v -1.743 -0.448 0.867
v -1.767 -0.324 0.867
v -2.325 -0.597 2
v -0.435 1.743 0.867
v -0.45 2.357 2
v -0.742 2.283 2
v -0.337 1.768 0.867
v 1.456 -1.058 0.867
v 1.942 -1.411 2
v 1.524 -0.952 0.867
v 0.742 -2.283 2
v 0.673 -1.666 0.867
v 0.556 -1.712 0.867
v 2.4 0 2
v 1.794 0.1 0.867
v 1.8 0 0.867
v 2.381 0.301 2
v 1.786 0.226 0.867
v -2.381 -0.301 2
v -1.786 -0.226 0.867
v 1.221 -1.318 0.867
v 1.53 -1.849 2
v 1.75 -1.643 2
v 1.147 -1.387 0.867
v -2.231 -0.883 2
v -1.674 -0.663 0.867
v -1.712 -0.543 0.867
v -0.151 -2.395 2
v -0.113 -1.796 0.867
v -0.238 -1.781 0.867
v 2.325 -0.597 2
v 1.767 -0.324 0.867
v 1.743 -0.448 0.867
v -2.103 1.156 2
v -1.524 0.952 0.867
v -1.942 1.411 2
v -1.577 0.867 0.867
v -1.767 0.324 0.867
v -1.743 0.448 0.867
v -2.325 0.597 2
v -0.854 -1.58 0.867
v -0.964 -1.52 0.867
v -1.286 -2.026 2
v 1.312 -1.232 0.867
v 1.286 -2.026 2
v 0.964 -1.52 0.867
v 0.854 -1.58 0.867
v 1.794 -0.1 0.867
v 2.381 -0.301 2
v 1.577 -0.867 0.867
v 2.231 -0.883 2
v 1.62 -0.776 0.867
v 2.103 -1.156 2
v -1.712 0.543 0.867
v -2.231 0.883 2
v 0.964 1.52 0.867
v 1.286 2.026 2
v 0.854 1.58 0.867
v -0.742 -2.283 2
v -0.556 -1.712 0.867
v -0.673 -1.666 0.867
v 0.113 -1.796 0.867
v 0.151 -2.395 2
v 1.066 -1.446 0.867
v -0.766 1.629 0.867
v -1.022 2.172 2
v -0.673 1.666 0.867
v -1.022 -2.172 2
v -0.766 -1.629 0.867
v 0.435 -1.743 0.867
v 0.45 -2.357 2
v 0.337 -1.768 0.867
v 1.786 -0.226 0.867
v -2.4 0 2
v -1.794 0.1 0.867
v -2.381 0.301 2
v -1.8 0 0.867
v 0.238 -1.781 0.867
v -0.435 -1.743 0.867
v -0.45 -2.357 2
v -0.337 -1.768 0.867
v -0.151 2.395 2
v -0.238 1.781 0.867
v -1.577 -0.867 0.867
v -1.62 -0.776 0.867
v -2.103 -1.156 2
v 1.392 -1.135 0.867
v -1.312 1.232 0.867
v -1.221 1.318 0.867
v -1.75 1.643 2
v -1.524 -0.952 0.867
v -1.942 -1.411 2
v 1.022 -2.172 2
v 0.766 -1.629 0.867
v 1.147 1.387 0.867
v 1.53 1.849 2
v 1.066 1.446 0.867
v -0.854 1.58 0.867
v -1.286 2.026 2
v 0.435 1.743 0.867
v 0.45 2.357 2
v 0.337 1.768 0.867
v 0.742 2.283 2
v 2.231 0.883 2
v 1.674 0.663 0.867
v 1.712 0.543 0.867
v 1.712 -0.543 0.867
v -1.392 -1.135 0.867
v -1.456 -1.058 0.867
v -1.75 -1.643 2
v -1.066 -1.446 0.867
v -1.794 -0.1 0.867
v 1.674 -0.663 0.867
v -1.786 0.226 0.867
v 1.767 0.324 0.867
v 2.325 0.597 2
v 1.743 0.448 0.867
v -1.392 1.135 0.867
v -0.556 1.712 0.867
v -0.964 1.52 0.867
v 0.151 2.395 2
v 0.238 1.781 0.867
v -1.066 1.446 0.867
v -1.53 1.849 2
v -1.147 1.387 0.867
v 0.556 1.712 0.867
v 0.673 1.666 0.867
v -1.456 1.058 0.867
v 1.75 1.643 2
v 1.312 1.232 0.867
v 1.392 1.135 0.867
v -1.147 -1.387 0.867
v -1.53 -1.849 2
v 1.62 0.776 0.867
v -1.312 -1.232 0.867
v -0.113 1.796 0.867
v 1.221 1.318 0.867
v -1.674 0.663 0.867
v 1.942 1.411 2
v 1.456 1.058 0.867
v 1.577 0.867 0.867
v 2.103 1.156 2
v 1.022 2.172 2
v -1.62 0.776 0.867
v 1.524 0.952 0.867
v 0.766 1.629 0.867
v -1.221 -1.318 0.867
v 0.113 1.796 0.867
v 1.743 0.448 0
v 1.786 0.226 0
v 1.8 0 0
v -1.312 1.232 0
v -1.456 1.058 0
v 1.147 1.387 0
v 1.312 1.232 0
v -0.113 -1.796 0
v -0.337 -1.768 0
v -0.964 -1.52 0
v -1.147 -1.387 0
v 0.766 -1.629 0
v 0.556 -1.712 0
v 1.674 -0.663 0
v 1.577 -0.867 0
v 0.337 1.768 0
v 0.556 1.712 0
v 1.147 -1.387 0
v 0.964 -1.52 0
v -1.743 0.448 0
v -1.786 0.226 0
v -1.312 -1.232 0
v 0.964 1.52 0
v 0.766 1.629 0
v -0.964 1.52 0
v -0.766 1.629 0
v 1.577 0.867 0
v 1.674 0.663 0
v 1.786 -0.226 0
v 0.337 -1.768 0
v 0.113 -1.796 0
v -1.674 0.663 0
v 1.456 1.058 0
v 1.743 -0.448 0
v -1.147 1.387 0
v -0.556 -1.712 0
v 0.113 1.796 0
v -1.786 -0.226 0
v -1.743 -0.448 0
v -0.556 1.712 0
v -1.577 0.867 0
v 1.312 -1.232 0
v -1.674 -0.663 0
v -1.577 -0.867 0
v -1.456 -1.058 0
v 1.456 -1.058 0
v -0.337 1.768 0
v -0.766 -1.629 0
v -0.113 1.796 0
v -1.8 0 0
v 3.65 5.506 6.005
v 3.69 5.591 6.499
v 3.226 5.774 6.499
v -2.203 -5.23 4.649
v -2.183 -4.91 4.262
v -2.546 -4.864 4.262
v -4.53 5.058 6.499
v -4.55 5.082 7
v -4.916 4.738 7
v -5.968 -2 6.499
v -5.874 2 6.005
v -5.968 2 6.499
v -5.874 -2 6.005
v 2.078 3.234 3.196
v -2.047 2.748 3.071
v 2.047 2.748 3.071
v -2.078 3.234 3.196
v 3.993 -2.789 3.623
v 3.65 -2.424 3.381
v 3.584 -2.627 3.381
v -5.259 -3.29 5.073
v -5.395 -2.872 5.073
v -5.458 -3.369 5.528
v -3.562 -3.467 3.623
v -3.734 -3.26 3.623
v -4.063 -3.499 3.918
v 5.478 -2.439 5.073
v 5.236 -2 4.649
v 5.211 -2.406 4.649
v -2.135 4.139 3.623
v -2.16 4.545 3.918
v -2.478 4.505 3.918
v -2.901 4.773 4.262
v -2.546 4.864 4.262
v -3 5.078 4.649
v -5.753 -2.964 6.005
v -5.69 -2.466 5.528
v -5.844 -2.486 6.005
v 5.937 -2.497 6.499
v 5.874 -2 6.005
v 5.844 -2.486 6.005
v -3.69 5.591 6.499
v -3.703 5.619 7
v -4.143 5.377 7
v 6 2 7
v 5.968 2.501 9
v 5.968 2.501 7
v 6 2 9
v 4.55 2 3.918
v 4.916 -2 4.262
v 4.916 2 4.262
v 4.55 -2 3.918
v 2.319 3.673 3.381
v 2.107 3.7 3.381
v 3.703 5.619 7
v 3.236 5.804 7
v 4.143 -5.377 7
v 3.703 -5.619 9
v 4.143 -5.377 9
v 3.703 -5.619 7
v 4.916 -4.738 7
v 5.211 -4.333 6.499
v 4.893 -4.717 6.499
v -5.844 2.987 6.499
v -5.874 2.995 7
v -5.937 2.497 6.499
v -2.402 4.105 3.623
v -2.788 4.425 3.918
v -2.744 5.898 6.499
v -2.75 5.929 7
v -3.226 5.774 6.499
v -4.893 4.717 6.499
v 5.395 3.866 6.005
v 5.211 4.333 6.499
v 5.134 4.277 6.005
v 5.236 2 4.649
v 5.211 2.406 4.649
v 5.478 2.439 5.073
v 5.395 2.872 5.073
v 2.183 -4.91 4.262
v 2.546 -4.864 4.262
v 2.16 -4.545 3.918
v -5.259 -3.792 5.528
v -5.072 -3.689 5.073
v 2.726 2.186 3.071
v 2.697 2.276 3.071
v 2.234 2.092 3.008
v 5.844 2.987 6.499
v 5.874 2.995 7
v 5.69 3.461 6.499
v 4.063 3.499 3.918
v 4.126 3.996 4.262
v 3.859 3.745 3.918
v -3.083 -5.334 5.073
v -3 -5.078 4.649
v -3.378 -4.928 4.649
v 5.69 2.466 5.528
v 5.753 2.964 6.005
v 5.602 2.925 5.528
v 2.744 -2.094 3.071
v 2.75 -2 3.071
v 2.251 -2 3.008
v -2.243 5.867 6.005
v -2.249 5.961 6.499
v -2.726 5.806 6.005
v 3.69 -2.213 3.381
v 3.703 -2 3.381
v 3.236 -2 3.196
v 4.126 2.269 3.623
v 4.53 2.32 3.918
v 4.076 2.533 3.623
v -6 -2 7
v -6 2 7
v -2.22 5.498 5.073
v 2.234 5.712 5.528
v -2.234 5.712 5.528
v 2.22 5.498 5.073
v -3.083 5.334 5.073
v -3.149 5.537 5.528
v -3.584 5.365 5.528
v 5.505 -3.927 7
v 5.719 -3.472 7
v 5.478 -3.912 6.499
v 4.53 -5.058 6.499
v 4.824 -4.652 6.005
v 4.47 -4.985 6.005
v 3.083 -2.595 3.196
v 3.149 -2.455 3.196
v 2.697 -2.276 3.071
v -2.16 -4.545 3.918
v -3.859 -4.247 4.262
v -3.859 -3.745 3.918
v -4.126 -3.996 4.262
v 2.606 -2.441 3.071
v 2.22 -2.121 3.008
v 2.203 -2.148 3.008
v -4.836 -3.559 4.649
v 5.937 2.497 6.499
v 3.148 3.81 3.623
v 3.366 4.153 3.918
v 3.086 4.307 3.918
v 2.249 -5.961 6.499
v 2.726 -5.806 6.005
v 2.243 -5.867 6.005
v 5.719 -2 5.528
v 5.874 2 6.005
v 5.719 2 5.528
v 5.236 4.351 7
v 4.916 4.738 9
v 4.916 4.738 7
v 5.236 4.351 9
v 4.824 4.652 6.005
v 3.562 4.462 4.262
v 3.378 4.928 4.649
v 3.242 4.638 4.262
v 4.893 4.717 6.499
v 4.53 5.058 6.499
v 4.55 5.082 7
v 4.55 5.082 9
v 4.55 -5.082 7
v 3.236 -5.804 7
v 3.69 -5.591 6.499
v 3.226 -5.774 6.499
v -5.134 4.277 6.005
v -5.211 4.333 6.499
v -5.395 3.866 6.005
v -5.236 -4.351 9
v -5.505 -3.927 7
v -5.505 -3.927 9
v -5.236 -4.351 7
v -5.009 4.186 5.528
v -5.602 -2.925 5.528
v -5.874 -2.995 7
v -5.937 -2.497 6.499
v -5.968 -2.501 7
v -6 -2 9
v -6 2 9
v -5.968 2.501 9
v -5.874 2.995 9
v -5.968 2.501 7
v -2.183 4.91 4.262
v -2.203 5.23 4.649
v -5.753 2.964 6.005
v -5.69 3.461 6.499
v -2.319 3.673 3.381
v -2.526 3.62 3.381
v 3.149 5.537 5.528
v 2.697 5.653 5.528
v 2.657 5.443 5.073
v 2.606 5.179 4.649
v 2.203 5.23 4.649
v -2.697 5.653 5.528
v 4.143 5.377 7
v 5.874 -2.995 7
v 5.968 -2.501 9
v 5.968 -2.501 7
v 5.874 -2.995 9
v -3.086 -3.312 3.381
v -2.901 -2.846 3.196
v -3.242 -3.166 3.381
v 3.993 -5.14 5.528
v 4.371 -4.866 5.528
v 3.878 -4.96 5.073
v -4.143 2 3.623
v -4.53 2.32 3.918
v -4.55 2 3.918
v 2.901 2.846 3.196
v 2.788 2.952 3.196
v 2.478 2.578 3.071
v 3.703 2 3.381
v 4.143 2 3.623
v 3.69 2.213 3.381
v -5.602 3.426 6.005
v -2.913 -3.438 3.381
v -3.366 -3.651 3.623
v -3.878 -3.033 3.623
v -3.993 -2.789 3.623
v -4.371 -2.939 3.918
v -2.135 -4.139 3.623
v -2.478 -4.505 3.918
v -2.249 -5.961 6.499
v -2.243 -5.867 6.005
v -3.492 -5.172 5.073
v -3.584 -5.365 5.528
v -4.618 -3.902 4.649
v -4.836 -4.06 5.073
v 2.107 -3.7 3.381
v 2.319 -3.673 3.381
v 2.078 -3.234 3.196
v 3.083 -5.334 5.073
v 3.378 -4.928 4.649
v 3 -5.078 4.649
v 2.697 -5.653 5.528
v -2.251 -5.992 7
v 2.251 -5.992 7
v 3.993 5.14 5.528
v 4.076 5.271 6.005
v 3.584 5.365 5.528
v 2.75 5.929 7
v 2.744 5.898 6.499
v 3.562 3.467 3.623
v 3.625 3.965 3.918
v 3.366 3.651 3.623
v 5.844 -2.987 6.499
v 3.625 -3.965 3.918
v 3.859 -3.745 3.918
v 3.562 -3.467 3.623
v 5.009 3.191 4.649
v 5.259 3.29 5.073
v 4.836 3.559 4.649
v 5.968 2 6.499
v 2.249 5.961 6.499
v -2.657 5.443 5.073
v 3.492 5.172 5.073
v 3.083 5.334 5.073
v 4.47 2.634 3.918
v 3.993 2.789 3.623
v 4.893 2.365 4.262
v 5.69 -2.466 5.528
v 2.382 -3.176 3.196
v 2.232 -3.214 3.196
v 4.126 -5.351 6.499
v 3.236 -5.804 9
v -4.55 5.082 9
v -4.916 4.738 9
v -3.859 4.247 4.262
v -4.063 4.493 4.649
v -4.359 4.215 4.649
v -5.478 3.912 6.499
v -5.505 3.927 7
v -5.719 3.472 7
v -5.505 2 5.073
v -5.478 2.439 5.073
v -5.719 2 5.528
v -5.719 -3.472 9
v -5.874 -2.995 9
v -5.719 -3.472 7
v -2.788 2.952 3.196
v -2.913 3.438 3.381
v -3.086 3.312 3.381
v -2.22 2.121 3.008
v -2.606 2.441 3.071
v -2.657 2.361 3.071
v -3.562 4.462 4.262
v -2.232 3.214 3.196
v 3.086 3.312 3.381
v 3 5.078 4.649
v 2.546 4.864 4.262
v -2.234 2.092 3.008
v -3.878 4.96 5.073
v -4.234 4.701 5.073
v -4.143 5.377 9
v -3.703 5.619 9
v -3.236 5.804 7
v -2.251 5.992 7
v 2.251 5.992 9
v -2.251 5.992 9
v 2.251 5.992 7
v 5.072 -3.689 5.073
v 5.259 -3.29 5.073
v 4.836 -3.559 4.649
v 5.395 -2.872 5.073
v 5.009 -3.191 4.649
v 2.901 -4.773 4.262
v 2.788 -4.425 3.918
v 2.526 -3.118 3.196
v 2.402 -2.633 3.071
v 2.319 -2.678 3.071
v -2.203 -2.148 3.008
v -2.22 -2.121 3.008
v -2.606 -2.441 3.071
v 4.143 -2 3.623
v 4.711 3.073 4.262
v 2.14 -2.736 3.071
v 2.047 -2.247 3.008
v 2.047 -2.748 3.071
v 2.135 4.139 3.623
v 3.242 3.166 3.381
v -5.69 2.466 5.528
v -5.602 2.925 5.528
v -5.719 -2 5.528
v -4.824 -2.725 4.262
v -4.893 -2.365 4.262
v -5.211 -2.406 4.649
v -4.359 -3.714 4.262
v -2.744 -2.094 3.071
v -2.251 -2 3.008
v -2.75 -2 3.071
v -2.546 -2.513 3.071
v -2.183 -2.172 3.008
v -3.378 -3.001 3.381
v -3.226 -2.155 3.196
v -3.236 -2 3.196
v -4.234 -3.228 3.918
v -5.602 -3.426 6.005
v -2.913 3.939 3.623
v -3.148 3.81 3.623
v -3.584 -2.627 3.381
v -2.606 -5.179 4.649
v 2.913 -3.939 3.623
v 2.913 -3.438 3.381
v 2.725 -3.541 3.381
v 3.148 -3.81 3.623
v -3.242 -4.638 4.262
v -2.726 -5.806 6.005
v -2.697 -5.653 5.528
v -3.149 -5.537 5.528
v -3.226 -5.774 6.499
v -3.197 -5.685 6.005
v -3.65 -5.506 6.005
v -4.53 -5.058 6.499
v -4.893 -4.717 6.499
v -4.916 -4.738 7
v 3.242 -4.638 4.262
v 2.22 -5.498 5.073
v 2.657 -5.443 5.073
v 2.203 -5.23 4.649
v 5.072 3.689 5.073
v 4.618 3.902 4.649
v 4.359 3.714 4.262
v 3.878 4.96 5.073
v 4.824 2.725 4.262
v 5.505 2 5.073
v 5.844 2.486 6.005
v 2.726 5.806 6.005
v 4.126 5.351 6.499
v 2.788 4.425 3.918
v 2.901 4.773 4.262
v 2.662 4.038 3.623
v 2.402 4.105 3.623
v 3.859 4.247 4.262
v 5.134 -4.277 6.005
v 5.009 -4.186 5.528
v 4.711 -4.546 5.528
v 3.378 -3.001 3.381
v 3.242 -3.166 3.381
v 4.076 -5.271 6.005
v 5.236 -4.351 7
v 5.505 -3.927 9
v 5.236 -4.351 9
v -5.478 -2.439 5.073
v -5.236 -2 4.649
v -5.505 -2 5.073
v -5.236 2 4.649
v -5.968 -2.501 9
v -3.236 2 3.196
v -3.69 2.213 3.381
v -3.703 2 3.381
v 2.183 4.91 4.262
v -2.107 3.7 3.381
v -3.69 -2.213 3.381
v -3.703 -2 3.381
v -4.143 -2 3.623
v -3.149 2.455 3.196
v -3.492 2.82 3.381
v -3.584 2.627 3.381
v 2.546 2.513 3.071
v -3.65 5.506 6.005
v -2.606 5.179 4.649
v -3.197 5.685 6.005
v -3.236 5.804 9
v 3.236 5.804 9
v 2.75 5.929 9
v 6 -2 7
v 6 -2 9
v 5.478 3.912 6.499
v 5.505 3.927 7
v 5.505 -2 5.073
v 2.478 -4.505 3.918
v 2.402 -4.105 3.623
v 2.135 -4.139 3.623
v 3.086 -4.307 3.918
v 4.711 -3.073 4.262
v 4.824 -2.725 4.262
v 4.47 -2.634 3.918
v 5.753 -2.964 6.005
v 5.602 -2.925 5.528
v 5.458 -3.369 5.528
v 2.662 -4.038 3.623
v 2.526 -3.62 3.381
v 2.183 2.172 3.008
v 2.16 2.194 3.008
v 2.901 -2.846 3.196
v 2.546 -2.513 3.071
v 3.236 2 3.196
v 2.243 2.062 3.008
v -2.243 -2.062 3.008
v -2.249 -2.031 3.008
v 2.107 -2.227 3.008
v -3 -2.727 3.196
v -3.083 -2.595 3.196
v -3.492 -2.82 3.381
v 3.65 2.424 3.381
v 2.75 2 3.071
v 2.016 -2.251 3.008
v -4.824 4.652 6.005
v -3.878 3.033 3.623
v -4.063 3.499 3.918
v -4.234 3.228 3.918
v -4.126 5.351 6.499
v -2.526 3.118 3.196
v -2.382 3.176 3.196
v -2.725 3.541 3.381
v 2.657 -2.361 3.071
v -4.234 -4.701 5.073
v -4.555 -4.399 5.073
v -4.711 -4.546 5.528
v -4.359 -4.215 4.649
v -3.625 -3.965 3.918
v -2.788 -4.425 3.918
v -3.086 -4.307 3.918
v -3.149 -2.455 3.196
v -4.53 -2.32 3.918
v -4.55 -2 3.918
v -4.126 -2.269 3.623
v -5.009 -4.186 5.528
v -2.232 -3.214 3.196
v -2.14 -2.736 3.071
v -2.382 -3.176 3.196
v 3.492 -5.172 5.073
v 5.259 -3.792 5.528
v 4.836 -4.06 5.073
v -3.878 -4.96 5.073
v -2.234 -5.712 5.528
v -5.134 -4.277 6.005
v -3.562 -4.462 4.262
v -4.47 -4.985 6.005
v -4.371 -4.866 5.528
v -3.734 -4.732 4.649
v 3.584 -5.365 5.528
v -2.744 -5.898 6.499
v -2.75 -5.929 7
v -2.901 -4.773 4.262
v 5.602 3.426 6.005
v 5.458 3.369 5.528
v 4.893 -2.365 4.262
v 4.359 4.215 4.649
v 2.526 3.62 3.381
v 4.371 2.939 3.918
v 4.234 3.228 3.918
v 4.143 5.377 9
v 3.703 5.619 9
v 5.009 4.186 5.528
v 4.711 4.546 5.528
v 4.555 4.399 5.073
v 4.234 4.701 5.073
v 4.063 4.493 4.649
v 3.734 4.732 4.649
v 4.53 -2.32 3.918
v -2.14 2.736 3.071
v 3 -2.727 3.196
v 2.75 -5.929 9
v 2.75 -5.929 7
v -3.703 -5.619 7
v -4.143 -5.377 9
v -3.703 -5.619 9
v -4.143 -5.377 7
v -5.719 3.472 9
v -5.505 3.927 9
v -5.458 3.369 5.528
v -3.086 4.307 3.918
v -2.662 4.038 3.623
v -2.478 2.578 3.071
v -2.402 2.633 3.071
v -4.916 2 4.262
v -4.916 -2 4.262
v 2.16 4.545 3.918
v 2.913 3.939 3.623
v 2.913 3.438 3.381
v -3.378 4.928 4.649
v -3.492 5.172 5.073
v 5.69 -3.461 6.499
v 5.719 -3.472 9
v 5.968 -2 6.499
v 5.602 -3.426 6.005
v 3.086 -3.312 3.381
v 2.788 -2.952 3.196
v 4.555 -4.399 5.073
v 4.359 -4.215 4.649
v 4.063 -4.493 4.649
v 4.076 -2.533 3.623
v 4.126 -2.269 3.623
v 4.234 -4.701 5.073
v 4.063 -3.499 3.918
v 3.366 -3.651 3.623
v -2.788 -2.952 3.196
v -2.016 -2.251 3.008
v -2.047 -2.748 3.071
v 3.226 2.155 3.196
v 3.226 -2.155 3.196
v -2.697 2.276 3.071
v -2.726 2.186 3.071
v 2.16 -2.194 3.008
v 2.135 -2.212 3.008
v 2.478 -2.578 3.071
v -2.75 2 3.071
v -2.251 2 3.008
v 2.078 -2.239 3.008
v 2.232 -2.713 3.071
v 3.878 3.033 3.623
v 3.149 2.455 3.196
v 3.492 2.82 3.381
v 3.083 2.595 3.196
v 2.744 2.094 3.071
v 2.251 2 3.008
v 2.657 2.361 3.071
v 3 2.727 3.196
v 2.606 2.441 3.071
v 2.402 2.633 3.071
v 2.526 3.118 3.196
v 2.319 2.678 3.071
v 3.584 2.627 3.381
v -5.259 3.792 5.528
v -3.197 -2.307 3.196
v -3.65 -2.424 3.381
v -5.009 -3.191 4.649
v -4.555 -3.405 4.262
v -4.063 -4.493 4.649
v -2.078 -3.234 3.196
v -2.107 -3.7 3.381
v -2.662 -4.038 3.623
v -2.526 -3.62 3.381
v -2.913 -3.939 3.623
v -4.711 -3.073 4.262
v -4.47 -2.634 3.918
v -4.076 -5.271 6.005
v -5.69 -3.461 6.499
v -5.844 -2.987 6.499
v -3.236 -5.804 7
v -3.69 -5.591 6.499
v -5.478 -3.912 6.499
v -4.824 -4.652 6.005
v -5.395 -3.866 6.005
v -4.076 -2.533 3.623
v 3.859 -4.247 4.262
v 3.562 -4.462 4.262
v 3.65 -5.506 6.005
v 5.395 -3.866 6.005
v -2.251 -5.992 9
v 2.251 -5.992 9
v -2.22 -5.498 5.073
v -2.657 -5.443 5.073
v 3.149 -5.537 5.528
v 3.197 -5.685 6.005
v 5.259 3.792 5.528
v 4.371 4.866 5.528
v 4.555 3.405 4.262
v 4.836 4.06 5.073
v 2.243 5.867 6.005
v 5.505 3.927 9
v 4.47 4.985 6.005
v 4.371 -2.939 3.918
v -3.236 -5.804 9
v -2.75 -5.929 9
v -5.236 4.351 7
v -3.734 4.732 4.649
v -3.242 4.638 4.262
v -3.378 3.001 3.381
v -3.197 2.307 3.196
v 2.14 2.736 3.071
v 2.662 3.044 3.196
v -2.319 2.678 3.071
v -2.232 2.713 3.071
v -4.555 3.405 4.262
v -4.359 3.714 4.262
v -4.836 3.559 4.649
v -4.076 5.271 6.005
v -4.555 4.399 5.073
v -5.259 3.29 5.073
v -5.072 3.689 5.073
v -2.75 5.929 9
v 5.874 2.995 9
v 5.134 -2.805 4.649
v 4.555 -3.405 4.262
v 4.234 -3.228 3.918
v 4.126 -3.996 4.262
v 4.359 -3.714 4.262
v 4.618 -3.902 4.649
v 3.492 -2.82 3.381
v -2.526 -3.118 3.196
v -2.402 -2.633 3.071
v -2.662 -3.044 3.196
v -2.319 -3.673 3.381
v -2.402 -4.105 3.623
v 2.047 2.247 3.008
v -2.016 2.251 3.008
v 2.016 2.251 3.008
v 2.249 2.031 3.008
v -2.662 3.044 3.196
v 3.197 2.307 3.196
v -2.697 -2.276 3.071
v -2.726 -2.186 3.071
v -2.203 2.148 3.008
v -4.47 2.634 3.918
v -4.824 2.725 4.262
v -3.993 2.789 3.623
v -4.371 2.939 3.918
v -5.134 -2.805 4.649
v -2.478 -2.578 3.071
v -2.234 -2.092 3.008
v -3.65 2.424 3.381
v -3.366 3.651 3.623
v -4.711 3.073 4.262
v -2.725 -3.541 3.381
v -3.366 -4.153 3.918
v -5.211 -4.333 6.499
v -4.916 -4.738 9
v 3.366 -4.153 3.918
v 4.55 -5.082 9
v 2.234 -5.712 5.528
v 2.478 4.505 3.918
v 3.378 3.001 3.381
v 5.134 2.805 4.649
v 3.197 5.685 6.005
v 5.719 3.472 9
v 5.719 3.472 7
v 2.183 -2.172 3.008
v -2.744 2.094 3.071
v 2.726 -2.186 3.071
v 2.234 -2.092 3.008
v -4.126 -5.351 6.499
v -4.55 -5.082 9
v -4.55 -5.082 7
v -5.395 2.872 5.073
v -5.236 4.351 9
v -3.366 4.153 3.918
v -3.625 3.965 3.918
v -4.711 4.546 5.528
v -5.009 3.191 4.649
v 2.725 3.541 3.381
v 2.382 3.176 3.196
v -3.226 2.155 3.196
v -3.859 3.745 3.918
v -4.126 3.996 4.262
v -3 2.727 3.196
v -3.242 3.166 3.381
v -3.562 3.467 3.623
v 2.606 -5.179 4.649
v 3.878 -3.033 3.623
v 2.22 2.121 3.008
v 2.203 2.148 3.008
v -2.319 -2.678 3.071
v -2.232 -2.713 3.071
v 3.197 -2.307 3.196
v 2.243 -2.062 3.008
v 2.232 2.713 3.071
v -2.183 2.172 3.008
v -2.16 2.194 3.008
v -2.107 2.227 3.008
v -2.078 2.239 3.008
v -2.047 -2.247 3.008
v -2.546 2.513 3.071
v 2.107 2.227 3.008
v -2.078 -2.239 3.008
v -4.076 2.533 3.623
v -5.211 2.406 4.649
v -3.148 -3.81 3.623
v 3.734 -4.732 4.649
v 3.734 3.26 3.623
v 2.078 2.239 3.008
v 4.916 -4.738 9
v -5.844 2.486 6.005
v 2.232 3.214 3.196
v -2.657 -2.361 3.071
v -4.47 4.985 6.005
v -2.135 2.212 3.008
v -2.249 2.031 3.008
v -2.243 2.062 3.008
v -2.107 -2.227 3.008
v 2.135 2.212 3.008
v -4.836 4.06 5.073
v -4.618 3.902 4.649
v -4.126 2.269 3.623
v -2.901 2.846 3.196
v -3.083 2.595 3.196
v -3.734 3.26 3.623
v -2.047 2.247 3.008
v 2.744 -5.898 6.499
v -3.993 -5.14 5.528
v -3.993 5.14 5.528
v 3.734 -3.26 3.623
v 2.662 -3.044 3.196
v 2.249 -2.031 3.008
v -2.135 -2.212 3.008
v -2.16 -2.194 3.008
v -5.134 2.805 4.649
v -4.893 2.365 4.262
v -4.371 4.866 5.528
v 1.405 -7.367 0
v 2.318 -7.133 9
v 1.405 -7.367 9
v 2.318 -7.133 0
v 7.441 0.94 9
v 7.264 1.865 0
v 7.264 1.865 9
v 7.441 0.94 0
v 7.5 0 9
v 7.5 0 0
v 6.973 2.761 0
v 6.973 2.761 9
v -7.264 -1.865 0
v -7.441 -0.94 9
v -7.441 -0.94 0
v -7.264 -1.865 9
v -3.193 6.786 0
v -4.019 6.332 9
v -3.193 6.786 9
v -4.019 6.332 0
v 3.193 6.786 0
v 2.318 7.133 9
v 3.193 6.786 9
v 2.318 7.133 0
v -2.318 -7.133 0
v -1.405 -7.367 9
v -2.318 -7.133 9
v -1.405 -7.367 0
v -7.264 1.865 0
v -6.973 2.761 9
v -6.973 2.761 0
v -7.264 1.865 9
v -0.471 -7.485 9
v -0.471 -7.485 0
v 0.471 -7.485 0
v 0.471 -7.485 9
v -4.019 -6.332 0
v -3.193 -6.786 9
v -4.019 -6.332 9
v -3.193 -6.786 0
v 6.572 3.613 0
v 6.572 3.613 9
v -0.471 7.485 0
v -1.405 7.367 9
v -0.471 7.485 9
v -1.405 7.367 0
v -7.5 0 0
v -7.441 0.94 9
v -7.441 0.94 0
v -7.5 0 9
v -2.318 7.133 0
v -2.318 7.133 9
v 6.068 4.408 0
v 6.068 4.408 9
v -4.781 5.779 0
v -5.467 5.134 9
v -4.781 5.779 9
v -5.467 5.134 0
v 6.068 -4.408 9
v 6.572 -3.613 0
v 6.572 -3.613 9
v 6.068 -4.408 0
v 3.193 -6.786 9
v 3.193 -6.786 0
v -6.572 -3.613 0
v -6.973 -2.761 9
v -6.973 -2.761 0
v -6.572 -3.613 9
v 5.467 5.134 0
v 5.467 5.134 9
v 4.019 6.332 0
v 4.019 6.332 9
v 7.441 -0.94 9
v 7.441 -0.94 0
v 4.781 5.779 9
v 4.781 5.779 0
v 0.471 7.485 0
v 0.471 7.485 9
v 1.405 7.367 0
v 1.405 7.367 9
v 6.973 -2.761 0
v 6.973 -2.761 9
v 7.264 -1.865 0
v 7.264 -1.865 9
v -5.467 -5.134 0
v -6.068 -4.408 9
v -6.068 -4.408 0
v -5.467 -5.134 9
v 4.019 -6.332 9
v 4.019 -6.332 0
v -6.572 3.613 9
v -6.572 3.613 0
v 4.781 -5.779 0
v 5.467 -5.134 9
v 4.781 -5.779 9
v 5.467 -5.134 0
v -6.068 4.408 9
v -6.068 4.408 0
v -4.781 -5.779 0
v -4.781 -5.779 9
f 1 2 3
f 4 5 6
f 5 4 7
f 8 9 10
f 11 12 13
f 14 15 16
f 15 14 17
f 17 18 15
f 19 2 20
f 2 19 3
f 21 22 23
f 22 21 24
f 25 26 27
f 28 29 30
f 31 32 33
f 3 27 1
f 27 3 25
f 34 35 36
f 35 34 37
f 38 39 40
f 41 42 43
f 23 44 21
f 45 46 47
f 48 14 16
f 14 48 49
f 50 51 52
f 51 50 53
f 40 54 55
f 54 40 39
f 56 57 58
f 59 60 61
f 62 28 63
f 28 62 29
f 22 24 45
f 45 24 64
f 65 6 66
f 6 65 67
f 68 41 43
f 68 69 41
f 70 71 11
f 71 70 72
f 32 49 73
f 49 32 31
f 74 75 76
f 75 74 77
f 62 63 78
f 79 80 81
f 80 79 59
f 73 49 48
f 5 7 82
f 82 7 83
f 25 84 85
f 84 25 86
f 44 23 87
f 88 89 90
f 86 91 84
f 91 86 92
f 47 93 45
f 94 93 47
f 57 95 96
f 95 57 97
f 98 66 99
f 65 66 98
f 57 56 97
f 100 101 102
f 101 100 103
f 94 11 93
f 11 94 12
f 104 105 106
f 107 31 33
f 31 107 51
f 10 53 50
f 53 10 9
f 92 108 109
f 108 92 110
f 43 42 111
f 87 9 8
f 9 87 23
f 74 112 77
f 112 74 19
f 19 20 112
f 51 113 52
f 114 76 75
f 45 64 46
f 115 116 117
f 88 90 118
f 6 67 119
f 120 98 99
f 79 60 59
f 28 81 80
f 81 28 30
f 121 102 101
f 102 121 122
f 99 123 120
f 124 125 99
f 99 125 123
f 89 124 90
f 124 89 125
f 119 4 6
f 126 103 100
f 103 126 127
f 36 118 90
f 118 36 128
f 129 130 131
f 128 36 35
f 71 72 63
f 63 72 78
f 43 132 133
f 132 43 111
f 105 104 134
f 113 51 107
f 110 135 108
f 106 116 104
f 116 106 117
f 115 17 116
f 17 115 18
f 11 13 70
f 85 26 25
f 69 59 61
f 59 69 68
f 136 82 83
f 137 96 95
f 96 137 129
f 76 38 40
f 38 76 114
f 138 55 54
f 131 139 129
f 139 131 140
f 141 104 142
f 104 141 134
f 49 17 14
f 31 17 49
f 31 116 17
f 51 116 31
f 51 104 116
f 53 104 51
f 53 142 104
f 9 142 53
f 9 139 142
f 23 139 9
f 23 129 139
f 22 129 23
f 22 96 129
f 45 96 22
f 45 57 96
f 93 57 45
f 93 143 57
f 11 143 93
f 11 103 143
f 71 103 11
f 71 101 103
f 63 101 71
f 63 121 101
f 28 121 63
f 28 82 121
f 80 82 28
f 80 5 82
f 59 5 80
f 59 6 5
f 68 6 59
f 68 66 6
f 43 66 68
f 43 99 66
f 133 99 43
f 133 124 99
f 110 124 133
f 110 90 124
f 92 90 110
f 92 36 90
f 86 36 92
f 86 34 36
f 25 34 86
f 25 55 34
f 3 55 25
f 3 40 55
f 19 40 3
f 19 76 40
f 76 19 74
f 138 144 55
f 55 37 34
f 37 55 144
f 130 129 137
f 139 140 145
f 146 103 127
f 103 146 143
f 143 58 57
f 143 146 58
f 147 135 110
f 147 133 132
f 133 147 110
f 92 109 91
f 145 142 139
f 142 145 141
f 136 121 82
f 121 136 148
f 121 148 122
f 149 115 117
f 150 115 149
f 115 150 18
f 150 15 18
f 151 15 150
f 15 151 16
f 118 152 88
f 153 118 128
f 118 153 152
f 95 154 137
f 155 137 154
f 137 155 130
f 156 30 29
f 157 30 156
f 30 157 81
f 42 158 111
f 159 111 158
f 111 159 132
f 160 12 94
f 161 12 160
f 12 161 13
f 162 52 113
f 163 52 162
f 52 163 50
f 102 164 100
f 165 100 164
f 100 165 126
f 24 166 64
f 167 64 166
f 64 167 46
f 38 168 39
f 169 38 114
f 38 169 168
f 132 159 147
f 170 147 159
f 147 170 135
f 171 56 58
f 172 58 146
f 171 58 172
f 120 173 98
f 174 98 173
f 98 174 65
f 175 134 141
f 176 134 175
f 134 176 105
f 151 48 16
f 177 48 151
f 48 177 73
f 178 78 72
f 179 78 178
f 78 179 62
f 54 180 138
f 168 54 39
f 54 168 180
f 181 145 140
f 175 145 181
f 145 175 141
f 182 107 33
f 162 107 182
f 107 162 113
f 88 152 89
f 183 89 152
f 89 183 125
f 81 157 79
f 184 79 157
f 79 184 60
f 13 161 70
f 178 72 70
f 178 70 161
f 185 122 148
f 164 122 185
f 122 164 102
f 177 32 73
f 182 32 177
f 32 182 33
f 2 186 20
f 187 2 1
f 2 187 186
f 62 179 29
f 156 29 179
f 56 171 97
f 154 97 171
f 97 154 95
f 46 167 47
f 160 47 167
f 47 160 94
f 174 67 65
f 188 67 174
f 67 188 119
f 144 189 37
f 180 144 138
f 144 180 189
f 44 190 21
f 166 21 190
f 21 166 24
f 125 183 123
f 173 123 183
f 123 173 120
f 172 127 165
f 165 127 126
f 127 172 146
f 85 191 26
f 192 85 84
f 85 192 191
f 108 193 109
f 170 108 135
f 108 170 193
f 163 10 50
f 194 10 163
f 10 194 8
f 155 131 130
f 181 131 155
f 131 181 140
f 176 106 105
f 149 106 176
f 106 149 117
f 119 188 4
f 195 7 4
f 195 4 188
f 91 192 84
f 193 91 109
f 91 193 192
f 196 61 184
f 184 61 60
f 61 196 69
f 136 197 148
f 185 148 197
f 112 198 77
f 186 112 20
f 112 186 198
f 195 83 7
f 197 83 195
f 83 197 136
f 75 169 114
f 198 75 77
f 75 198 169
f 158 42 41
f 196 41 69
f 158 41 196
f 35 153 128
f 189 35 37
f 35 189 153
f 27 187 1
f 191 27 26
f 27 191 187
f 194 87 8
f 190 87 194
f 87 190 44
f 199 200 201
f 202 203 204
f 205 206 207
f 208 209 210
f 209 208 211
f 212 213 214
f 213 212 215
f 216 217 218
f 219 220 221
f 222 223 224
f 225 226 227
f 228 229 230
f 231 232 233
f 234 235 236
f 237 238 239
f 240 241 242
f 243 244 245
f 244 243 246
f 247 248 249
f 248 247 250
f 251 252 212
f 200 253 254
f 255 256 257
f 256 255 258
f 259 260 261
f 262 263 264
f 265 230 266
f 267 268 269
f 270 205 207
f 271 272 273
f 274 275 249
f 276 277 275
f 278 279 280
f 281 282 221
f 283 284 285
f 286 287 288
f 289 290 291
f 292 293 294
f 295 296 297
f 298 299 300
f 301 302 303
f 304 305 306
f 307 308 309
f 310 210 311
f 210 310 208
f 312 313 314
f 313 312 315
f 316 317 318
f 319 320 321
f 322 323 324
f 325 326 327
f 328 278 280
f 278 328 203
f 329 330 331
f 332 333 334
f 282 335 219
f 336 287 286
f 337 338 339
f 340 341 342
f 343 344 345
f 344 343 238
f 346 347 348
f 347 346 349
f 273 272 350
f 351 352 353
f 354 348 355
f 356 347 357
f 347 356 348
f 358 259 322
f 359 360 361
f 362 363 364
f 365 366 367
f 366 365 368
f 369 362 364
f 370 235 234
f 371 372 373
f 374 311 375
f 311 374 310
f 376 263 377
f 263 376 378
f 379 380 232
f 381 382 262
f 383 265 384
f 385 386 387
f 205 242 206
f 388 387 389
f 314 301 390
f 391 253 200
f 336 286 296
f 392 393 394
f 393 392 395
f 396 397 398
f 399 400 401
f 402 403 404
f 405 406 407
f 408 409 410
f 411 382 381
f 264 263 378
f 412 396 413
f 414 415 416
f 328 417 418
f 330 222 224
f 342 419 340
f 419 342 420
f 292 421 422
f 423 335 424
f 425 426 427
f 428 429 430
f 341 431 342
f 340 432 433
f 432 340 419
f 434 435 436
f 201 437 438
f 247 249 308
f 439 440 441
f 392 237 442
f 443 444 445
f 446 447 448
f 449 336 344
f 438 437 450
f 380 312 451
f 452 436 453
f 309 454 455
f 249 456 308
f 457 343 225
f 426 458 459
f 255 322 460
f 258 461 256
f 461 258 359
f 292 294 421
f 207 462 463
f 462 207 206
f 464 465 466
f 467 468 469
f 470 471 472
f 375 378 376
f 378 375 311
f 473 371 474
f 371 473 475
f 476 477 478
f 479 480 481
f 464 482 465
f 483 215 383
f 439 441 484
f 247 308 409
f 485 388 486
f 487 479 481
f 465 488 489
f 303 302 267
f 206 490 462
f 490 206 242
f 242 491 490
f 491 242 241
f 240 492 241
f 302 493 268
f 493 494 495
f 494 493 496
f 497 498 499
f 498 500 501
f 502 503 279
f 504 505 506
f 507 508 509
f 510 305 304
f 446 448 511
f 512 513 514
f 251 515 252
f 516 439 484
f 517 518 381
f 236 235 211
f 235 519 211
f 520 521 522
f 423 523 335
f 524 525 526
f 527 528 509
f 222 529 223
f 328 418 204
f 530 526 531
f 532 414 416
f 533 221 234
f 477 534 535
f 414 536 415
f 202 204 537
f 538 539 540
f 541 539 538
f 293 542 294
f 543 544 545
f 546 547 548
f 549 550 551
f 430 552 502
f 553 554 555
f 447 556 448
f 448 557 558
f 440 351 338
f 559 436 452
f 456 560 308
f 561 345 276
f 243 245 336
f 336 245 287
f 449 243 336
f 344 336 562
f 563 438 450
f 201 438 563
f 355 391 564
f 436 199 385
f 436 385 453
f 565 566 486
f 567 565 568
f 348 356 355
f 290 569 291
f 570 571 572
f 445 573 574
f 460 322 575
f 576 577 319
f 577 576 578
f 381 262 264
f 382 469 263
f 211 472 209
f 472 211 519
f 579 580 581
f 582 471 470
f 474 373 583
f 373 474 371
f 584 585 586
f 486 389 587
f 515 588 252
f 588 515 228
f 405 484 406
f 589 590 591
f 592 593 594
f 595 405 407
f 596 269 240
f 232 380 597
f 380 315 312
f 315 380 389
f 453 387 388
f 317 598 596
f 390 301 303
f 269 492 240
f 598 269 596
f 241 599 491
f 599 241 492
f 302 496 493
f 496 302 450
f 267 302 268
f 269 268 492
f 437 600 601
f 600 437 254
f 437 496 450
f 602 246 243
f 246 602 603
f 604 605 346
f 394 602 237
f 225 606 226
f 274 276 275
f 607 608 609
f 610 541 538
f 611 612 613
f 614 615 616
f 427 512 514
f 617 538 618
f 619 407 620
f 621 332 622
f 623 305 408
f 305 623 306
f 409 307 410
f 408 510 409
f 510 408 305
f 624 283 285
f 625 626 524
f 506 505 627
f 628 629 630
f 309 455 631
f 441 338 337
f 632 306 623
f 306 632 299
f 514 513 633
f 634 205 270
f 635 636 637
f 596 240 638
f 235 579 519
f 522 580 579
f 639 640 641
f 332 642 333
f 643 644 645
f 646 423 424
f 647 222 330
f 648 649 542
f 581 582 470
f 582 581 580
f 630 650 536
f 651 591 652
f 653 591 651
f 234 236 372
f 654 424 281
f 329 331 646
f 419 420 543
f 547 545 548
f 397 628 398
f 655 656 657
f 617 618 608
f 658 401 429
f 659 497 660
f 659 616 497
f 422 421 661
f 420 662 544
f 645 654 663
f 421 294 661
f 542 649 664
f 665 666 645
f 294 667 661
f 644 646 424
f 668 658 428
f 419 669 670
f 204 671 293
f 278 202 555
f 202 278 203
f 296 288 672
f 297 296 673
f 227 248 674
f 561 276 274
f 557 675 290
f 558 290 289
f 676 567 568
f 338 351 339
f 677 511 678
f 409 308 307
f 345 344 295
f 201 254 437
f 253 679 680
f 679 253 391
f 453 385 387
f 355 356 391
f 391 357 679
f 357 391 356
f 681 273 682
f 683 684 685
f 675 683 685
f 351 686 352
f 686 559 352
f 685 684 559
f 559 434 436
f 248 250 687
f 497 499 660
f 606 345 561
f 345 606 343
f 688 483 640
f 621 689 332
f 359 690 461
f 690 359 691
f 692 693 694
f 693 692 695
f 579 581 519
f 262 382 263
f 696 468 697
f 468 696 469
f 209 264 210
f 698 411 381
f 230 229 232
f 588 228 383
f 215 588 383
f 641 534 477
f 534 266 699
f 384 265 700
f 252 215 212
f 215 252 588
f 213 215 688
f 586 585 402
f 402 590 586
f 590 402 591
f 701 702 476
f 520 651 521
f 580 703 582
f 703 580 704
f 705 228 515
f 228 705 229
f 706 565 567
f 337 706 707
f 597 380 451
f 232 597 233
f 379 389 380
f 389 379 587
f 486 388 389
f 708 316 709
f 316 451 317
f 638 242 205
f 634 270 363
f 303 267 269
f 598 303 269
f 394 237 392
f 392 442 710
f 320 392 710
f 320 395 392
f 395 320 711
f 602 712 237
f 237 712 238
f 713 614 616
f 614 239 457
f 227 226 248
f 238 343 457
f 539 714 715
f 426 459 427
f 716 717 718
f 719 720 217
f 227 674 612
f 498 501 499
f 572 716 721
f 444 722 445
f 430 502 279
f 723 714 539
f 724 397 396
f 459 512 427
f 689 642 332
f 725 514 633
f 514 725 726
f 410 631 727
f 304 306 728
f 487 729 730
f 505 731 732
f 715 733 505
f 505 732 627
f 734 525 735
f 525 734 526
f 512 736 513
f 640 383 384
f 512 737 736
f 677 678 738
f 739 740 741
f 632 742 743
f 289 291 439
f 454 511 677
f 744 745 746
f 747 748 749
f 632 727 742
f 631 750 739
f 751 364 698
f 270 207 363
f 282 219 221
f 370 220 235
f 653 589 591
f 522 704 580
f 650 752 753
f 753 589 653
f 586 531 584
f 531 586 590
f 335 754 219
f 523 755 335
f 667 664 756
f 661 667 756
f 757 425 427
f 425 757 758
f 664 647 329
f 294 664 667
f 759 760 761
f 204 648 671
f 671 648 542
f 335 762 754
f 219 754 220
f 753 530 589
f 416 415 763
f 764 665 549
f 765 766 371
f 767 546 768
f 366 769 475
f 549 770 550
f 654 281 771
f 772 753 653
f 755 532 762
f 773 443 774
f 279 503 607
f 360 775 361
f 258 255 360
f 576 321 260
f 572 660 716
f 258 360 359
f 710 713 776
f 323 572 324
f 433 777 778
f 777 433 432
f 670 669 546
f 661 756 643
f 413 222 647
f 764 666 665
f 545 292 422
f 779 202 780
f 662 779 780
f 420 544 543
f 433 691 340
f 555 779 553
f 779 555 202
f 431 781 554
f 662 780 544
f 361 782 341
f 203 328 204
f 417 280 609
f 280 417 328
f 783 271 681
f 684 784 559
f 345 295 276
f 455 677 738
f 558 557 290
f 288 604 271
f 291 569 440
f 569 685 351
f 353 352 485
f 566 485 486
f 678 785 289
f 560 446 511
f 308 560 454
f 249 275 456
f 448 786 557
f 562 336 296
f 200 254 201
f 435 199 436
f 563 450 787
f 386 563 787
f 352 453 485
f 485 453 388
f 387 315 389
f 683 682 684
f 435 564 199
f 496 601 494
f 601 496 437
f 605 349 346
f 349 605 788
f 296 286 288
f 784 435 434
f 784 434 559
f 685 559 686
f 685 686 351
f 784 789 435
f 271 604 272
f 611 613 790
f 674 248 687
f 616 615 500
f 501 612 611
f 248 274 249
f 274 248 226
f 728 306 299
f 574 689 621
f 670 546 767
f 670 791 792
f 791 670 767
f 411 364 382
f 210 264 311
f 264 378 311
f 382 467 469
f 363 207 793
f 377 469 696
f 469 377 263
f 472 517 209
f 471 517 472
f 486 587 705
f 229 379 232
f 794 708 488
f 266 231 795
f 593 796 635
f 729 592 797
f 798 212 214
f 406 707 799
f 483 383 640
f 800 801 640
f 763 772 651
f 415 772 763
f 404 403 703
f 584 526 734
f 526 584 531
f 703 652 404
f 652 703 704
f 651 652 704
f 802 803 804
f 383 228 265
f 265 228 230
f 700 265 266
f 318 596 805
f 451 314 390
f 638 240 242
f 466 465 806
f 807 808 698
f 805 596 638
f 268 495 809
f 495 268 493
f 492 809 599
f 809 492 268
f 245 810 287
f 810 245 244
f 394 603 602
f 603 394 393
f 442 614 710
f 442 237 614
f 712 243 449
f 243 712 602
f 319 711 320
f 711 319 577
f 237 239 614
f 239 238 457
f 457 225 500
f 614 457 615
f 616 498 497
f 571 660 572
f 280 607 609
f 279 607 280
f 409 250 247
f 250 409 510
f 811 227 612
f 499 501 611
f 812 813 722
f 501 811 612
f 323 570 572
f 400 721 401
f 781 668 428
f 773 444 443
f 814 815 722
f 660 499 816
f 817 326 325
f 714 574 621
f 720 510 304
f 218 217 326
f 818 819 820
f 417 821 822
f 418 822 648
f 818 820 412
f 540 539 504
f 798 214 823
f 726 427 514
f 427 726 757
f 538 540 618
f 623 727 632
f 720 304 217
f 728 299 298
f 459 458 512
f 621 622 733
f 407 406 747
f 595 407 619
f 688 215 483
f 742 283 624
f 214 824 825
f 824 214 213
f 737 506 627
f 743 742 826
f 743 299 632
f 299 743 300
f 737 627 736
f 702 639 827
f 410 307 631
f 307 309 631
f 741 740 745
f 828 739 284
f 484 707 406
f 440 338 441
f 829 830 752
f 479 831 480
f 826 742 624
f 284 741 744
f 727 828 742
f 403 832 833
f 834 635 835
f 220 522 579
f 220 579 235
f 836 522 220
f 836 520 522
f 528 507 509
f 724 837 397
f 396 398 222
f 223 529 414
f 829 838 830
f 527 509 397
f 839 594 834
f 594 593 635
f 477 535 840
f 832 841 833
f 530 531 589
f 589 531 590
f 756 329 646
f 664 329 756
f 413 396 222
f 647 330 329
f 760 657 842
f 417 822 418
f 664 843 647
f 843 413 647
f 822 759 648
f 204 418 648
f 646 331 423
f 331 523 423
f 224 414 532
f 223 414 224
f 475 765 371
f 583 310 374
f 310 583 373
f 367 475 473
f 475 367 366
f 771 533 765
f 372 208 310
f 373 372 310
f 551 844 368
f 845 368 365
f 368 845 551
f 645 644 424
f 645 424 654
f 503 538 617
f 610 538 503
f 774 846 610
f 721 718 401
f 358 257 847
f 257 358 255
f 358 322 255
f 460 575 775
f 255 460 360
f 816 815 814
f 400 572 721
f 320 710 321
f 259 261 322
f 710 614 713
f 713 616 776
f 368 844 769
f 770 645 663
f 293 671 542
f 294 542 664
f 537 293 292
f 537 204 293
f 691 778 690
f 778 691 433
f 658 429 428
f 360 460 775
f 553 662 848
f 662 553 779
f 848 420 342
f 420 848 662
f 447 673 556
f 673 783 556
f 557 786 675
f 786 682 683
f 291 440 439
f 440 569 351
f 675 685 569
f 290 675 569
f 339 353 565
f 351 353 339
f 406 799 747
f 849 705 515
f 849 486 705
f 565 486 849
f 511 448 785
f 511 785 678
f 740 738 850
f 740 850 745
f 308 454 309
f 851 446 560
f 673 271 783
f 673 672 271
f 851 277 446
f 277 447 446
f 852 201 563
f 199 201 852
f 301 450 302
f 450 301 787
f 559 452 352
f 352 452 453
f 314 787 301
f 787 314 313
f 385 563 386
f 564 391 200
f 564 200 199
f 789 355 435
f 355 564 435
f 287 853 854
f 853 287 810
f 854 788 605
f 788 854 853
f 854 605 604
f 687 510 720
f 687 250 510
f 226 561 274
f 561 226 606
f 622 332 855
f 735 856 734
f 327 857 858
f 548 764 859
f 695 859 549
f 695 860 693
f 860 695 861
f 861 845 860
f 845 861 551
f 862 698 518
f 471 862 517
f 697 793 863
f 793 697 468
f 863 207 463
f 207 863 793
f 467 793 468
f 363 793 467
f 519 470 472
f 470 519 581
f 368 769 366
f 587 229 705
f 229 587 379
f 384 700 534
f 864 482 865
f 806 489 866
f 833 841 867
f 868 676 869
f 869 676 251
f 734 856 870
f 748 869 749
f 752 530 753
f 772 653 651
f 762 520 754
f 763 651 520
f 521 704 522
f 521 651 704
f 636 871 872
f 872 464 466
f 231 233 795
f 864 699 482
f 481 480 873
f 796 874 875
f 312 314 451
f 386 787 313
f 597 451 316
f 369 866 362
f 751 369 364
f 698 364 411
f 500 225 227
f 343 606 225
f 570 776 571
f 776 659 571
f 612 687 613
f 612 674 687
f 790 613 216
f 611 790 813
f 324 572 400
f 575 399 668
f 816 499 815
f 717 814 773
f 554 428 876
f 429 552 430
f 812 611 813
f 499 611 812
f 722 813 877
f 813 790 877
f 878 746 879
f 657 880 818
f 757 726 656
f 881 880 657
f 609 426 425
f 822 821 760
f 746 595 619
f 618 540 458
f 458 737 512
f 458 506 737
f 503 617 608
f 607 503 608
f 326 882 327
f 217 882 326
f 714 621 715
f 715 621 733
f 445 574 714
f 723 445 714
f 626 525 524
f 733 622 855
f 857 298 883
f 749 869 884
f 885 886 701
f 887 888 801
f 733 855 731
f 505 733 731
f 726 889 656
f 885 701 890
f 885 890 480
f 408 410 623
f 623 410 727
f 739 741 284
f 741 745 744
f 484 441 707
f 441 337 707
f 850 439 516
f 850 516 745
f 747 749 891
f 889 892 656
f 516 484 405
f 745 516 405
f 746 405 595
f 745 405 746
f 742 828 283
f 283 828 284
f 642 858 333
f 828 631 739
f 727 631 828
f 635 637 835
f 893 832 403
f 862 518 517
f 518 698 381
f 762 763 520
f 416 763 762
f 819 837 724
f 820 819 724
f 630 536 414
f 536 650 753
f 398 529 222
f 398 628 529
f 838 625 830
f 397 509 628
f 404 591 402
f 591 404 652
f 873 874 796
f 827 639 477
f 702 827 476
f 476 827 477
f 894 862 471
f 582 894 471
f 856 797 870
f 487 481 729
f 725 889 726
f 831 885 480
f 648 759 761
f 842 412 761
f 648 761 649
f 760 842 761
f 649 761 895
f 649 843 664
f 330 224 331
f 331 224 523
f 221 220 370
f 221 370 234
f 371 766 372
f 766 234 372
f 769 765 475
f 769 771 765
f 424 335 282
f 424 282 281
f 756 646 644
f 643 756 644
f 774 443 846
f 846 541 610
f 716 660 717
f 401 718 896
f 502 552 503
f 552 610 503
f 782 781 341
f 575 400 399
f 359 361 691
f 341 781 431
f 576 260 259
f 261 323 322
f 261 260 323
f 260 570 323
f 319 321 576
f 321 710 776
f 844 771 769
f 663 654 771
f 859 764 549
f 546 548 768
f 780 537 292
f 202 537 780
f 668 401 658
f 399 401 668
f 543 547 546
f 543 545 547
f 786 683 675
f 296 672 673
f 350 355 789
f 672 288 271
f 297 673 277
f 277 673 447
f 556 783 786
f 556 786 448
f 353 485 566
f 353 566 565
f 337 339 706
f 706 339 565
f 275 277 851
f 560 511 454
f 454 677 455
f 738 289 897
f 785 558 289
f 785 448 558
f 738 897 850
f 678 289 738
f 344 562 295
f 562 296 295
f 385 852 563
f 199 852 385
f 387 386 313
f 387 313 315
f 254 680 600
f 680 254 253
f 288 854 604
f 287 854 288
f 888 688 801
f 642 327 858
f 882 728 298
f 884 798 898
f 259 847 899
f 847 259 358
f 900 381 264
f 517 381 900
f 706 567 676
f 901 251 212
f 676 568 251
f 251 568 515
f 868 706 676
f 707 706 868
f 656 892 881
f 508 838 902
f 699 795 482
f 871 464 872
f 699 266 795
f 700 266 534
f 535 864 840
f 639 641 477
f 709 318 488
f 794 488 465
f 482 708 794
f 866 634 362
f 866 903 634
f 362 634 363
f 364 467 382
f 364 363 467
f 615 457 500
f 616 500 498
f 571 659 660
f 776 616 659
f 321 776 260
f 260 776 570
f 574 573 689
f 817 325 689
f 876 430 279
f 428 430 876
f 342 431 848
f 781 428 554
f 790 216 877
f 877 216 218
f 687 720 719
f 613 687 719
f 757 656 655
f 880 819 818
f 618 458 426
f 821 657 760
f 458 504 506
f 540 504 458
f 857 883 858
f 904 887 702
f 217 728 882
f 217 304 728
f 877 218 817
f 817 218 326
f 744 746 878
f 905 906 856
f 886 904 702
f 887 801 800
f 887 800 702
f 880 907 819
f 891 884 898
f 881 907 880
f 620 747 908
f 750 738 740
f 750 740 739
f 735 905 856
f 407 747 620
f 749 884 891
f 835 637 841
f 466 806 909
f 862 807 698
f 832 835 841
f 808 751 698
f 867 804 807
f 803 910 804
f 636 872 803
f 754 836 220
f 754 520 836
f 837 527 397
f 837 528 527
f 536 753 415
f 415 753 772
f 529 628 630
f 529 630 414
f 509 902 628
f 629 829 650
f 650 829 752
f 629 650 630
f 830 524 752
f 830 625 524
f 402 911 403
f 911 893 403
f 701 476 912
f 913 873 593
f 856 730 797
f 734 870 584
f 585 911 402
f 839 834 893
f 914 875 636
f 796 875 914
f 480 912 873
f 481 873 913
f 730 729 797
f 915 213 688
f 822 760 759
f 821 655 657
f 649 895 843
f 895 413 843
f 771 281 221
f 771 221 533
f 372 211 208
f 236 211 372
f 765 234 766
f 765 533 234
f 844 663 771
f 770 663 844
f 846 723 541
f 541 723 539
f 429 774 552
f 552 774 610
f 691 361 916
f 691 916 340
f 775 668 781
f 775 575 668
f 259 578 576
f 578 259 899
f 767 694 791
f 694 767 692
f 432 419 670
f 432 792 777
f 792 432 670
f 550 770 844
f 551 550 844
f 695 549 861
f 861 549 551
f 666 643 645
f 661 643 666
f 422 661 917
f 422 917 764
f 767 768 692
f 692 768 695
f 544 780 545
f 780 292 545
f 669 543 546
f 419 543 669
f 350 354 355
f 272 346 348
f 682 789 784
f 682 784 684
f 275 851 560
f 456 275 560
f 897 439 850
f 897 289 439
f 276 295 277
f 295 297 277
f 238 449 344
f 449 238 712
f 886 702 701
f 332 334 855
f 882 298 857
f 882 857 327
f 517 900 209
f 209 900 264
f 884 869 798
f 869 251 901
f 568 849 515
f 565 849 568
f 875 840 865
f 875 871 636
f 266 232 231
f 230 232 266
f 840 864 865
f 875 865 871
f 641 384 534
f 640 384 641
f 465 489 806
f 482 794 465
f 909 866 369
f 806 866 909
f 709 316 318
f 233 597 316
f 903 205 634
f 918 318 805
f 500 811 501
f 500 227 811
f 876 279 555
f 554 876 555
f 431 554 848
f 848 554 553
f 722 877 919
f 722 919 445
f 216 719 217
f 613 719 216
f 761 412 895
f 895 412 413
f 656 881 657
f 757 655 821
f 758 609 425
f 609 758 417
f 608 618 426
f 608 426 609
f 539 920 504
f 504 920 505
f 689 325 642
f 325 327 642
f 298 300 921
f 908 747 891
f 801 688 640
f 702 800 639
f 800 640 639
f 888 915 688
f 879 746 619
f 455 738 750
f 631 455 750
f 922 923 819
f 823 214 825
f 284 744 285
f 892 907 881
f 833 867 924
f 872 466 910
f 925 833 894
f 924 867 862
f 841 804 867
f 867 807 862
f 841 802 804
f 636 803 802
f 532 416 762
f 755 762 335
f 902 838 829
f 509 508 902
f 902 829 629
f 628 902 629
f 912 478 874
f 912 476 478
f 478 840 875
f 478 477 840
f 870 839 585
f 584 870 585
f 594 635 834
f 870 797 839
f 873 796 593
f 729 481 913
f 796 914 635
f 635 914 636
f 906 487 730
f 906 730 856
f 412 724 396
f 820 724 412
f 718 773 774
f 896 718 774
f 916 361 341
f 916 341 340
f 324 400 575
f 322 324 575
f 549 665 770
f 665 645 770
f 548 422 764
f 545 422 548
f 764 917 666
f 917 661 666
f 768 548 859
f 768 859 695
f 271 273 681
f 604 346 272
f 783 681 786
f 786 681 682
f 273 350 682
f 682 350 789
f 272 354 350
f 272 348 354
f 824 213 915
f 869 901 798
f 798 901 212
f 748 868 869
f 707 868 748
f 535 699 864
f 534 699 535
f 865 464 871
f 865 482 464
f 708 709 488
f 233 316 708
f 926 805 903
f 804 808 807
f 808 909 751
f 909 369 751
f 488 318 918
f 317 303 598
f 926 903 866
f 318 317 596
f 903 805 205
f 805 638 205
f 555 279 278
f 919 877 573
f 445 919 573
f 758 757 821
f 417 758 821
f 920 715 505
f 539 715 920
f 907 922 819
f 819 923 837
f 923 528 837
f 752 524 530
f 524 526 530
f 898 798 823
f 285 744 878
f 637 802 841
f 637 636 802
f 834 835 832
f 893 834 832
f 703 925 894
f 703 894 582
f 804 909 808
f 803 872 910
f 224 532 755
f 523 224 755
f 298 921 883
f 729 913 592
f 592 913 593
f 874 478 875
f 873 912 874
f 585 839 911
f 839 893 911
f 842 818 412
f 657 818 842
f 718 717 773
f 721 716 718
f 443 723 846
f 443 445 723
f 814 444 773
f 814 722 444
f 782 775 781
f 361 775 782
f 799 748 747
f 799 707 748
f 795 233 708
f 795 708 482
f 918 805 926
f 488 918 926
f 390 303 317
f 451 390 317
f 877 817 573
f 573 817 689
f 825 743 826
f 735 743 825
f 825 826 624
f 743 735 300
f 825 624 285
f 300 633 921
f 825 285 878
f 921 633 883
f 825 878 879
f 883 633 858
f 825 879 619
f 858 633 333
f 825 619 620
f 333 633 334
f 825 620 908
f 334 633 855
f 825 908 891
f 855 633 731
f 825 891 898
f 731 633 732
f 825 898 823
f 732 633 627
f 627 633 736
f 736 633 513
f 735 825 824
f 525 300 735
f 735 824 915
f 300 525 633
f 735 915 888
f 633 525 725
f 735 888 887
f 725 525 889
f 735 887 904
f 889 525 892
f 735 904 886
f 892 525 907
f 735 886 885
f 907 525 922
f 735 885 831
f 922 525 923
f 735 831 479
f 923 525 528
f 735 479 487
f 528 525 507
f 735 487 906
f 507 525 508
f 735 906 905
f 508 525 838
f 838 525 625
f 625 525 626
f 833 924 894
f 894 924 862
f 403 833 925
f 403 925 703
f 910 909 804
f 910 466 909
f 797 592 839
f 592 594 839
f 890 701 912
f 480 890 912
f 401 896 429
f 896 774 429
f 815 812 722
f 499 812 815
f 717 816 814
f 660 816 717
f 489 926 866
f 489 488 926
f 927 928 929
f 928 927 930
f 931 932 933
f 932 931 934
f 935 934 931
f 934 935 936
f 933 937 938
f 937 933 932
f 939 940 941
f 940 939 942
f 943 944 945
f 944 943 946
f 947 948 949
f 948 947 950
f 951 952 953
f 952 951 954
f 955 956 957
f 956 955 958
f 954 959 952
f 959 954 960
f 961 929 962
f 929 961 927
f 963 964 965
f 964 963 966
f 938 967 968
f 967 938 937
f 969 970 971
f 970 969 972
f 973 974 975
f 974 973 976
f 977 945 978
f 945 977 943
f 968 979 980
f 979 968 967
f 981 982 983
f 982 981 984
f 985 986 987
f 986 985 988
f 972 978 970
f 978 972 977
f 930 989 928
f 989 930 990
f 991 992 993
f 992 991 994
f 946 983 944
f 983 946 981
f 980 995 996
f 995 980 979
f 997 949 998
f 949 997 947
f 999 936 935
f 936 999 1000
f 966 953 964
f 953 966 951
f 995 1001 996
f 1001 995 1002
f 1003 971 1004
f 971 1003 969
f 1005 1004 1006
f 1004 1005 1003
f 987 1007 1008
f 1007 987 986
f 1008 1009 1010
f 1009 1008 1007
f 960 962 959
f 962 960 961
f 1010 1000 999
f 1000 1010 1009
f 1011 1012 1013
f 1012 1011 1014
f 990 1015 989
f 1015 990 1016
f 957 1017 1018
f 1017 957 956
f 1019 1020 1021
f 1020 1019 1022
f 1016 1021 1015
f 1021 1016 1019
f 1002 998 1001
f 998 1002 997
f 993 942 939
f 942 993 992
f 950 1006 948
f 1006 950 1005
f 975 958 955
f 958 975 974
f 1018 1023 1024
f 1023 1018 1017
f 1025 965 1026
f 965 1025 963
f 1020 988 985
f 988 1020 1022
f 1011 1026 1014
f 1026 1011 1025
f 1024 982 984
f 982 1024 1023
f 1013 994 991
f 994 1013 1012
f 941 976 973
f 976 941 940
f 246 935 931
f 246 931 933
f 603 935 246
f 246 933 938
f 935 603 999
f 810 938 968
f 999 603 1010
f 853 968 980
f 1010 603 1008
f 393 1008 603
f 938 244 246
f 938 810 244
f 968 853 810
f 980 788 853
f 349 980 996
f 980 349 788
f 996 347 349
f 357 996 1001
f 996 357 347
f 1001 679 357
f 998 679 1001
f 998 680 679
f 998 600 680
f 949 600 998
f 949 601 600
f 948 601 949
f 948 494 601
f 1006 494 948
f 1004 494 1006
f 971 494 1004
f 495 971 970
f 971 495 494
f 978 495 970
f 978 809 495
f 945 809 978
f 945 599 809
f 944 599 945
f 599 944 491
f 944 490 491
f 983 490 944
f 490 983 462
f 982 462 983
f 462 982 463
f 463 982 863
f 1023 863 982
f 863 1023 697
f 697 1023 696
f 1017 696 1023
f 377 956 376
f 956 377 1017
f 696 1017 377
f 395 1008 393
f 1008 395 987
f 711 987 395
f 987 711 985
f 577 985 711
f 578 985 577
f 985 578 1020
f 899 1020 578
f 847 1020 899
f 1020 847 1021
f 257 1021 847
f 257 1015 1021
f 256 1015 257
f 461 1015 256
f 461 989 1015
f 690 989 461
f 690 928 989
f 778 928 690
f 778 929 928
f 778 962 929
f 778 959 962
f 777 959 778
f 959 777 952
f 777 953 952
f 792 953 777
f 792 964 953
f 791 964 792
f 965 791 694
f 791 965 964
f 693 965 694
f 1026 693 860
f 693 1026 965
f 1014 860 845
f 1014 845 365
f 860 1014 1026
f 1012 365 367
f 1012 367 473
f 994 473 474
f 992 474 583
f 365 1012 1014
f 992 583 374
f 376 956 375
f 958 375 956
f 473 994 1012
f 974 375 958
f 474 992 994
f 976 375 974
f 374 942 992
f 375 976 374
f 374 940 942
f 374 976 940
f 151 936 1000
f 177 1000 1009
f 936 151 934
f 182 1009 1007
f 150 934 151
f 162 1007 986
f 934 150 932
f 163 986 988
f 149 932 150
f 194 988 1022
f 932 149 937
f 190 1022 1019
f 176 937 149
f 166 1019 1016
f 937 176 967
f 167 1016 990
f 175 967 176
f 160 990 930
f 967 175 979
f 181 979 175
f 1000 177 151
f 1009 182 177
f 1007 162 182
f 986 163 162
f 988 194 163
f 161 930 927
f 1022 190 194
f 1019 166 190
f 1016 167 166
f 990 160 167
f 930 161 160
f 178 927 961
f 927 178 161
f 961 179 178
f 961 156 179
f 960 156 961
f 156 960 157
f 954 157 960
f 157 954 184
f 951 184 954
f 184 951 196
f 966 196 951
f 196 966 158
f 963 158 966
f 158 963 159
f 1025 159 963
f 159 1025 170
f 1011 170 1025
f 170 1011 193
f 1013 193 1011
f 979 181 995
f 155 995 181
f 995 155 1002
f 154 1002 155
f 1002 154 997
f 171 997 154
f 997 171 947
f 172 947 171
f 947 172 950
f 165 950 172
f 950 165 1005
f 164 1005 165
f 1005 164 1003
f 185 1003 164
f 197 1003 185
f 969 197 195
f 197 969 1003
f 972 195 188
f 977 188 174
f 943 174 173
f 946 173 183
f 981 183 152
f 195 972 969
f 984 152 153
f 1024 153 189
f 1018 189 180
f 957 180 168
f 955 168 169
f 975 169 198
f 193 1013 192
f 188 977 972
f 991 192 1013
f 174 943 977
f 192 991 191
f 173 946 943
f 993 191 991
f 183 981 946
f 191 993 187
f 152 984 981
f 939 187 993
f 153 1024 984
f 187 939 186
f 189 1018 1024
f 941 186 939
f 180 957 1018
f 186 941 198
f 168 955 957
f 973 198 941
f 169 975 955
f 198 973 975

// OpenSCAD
$fn = 50;


difference() {
	union() {
		cylinder(h = 9, r = 7.5000000000);
	}
	union() {
		translate(v = [0.0000000000, 0.0000000000, 2]) {
			rotate(a = [0, 0, 0]) {
				difference() {
					union() {
						translate(v = [0, 0, -1.7000000000]) {
							cylinder(h = 1.7000000000, r1 = 1.5000000000, r2 = 2.4000000000);
						}
						translate(v = [0, 0, -6.0000000000]) {
							cylinder(h = 6, r = 1.5000000000);
						}
						translate(v = [0, 0, -6.0000000000]) {
							cylinder(h = 6, r = 1.8000000000);
						}
						translate(v = [0, 0, -6.0000000000]) {
							cylinder(h = 6, r = 1.5000000000);
						}
					}
					union();
				}
			}
		}
		translate(v = [0.0000000000, 0.0000000000, 2]) {
			rotate(a = [0, 0, 0]) {
				difference() {
					union() {
						translate(v = [0, 0, -1.7000000000]) {
							cylinder(h = 1.7000000000, r1 = 1.5000000000, r2 = 2.4000000000);
						}
						translate(v = [0, 0, -6.0000000000]) {
							cylinder(h = 6, r = 1.5000000000);
						}
						translate(v = [0, 0, -6.0000000000]) {
							cylinder(h = 6, r = 1.8000000000);
						}
						translate(v = [0, 0, -6.0000000000]) {
							cylinder(h = 6, r = 1.5000000000);
						}
					}
					union();
				}
			}
		}
		translate(v = [0.0000000000, 0.0000000000, 2]) {
			rotate(a = [0, 0, 0]) {
				difference() {
					union() {
						translate(v = [0, 0, -1.7000000000]) {
							cylinder(h = 1.7000000000, r1 = 1.5000000000, r2 = 2.4000000000);
						}
						translate(v = [0, 0, -6.0000000000]) {
							cylinder(h = 6, r = 1.5000000000);
						}
						translate(v = [0, 0, -6.0000000000]) {
							cylinder(h = 6, r = 1.8000000000);
						}
						translate(v = [0, 0, -6.0000000000]) {
							cylinder(h = 6, r = 1.5000000000);
						}
					}
					union();
				}
			}
		}
		translate(v = [0.0000000000, 0.0000000000, 2]) {
			rotate(a = [0, 0, 0]) {
				difference() {
					union() {
						translate(v = [0, 0, -1.7000000000]) {
							cylinder(h = 1.7000000000, r1 = 1.5000000000, r2 = 2.4000000000);
						}
						translate(v = [0, 0, -6.0000000000]) {
							cylinder(h = 6, r = 1.5000000000);
						}
						translate(v = [0, 0, -6.0000000000]) {
							cylinder(h = 6, r = 1.8000000000);
						}
						translate(v = [0, 0, -6.0000000000]) {
							cylinder(h = 6, r = 1.5000000000);
						}
					}
					union();
				}
			}
		}
		translate(v = [0, 0, 3]) {
			hull() {
				union() {
					translate(v = [-2.0000000000, 2.0000000000, 4]) {
						cylinder(h = 21, r = 4);
					}
					translate(v = [-2.0000000000, 2.0000000000, 4]) {
						sphere(r = 4);
					}
					translate(v = [-2.0000000000, 2.0000000000, 25]) {
						sphere(r = 4);
					}
				}
				union() {
					translate(v = [2.0000000000, 2.0000000000, 4]) {
						cylinder(h = 21, r = 4);
					}
					translate(v = [2.0000000000, 2.0000000000, 4]) {
						sphere(r = 4);
					}
					translate(v = [2.0000000000, 2.0000000000, 25]) {
						sphere(r = 4);
					}
				}
				union() {
					translate(v = [-2.0000000000, -2.0000000000, 4]) {
						cylinder(h = 21, r = 4);
					}
					translate(v = [-2.0000000000, -2.0000000000, 4]) {
						sphere(r = 4);
					}
					translate(v = [-2.0000000000, -2.0000000000, 25]) {
						sphere(r = 4);
					}
				}
				union() {
					translate(v = [2.0000000000, -2.0000000000, 4]) {
						cylinder(h = 21, r = 4);
					}
					translate(v = [2.0000000000, -2.0000000000, 4]) {
						sphere(r = 4);
					}
					translate(v = [2.0000000000, -2.0000000000, 25]) {
						sphere(r = 4);
					}
				}
			}
		}
	}
}
